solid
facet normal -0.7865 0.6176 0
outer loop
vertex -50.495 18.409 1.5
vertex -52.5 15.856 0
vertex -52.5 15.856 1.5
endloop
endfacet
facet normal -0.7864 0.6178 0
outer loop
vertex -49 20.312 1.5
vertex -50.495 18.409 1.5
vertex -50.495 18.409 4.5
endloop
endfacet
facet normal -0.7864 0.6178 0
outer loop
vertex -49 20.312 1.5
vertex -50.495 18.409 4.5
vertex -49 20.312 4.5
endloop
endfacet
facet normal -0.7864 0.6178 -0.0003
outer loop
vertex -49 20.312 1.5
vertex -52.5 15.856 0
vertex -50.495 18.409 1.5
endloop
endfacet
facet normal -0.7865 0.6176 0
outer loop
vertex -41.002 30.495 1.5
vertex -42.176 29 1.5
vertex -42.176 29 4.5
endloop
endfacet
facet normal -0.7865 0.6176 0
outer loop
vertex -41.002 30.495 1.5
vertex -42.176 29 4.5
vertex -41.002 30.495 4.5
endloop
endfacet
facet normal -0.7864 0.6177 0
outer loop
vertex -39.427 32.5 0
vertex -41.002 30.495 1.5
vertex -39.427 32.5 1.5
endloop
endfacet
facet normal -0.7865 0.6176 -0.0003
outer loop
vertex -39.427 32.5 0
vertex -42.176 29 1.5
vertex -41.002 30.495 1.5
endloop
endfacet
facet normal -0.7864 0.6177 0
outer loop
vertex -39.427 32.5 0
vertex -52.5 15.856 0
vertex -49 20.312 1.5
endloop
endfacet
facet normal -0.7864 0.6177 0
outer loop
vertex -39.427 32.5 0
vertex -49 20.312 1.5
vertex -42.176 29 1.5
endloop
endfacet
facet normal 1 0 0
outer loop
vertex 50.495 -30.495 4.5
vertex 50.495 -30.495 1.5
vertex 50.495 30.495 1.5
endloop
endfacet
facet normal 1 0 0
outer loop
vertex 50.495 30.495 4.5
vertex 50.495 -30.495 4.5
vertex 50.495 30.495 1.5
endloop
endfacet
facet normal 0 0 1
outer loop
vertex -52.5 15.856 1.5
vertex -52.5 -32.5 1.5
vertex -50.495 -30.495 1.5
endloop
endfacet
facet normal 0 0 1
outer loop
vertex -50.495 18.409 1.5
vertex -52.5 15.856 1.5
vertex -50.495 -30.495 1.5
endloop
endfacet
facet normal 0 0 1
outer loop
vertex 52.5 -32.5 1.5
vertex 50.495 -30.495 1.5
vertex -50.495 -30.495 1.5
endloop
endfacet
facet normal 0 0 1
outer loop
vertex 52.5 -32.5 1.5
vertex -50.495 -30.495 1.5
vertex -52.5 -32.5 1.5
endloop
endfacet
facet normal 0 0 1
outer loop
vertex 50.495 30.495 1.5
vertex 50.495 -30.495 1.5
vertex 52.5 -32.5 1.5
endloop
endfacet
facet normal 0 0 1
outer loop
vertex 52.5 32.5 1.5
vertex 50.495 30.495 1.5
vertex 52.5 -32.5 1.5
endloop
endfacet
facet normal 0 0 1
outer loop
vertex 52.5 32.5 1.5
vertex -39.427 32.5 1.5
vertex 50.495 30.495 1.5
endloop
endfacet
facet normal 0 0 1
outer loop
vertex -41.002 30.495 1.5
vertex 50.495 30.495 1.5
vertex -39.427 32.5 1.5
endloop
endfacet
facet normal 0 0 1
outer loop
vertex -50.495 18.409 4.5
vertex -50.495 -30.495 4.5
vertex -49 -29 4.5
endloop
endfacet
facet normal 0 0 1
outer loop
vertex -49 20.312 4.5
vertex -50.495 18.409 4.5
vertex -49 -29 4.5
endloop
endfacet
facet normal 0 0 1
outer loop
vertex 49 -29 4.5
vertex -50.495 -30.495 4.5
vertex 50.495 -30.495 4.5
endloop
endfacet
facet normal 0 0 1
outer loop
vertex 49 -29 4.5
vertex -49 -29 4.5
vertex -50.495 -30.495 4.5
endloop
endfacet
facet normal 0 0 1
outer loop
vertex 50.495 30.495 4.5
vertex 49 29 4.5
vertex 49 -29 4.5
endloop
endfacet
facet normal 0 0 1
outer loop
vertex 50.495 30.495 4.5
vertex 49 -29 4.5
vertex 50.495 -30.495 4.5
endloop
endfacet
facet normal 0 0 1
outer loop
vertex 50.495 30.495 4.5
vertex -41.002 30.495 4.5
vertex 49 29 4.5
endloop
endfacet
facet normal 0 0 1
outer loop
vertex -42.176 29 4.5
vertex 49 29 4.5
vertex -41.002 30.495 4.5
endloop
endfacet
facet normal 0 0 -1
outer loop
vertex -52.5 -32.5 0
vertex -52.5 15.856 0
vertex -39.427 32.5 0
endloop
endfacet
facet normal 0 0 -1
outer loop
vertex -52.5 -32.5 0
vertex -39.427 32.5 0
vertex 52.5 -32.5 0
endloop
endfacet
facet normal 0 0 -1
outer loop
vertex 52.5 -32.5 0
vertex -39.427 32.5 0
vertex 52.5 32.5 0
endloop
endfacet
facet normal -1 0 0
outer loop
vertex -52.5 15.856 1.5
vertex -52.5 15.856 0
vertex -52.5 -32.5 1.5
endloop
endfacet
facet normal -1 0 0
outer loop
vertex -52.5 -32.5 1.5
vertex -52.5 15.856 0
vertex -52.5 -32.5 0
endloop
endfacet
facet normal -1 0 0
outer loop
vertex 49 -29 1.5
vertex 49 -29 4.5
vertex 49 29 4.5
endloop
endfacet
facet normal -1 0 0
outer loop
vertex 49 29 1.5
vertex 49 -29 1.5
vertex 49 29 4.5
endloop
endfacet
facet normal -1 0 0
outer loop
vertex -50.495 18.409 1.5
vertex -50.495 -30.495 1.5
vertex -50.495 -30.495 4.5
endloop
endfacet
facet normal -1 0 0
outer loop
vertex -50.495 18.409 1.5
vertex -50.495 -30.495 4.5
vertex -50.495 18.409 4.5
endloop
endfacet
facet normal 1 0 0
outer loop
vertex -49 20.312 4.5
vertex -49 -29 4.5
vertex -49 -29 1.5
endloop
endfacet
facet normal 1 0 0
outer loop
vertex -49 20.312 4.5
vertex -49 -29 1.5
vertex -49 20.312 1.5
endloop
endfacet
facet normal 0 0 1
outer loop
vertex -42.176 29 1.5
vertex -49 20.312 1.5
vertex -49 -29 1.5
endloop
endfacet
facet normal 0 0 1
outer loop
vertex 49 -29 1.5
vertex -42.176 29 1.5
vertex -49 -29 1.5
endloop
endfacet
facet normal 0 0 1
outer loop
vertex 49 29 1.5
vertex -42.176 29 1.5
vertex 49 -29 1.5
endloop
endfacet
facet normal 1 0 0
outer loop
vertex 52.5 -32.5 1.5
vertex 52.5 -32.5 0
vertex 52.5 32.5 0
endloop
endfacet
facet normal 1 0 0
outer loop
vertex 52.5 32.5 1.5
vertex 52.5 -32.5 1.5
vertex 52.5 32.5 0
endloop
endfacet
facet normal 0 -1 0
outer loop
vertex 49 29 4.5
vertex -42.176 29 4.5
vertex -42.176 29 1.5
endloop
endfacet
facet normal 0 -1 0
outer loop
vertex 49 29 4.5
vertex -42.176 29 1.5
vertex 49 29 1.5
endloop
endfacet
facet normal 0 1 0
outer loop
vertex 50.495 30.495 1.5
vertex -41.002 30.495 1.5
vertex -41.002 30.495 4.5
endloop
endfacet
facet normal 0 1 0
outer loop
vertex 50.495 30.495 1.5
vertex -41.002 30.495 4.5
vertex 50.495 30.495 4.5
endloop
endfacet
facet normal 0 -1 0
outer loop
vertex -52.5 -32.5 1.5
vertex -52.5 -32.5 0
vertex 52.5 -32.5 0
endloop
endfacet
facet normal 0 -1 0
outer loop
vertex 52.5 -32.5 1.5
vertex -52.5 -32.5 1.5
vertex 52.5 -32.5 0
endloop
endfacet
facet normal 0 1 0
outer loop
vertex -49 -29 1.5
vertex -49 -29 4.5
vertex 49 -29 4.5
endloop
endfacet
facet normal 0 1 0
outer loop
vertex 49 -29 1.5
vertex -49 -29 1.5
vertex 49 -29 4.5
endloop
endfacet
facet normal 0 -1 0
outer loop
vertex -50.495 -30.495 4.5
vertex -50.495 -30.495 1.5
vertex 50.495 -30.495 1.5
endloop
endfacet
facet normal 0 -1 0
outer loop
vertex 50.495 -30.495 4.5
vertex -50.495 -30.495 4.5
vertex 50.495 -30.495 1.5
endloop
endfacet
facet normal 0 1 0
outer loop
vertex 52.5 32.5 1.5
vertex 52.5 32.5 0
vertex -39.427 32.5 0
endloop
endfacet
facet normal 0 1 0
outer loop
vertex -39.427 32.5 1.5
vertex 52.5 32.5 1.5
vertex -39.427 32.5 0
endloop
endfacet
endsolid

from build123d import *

# Parameters (mm, degrees)
F1_DEPTH = 1.5
F2_W     = 100.99
F2_H     = 60.99
F3_DEPTH = 3
F4_W     = 98
F4_H     = 58
F5_DEPTH = 3
F6_DEPTH = 25


with BuildPart() as f1:
    # F0 (on Top) → F1 (new body)
    with BuildSketch(Plane.XY):
        Polygon((-52.5, -32.5), (52.5, -32.5), (52.5, 32.5), (-39.427131, 32.5), (-52.5, 15.85602), align=None)
        Polygon((-52.5, 32.5), (-52.5, 15.85602), (-39.427131, 32.5), align=None)
    extrude(amount=F1_DEPTH)

    # F2 (on face) → F3 (join)
    with BuildSketch(Plane.XY.offset(1.5)):
        Rectangle(F2_W, F2_H)
    extrude(amount=F3_DEPTH)

    # F4 (on face) → F5 (cut)
    with BuildSketch(Plane.XY.offset(4.5)):
        Rectangle(F4_W, F4_H)
    extrude(amount=-F5_DEPTH, mode=Mode.SUBTRACT)

    # F0 (on Top) → F6 (cut)
    with BuildSketch(Plane.XY):
        Polygon((-52.5, 32.5), (-52.5, 15.85602), (-39.427131, 32.5), align=None)
    extrude(amount=F6_DEPTH, mode=Mode.SUBTRACT)


solid = f1.part
